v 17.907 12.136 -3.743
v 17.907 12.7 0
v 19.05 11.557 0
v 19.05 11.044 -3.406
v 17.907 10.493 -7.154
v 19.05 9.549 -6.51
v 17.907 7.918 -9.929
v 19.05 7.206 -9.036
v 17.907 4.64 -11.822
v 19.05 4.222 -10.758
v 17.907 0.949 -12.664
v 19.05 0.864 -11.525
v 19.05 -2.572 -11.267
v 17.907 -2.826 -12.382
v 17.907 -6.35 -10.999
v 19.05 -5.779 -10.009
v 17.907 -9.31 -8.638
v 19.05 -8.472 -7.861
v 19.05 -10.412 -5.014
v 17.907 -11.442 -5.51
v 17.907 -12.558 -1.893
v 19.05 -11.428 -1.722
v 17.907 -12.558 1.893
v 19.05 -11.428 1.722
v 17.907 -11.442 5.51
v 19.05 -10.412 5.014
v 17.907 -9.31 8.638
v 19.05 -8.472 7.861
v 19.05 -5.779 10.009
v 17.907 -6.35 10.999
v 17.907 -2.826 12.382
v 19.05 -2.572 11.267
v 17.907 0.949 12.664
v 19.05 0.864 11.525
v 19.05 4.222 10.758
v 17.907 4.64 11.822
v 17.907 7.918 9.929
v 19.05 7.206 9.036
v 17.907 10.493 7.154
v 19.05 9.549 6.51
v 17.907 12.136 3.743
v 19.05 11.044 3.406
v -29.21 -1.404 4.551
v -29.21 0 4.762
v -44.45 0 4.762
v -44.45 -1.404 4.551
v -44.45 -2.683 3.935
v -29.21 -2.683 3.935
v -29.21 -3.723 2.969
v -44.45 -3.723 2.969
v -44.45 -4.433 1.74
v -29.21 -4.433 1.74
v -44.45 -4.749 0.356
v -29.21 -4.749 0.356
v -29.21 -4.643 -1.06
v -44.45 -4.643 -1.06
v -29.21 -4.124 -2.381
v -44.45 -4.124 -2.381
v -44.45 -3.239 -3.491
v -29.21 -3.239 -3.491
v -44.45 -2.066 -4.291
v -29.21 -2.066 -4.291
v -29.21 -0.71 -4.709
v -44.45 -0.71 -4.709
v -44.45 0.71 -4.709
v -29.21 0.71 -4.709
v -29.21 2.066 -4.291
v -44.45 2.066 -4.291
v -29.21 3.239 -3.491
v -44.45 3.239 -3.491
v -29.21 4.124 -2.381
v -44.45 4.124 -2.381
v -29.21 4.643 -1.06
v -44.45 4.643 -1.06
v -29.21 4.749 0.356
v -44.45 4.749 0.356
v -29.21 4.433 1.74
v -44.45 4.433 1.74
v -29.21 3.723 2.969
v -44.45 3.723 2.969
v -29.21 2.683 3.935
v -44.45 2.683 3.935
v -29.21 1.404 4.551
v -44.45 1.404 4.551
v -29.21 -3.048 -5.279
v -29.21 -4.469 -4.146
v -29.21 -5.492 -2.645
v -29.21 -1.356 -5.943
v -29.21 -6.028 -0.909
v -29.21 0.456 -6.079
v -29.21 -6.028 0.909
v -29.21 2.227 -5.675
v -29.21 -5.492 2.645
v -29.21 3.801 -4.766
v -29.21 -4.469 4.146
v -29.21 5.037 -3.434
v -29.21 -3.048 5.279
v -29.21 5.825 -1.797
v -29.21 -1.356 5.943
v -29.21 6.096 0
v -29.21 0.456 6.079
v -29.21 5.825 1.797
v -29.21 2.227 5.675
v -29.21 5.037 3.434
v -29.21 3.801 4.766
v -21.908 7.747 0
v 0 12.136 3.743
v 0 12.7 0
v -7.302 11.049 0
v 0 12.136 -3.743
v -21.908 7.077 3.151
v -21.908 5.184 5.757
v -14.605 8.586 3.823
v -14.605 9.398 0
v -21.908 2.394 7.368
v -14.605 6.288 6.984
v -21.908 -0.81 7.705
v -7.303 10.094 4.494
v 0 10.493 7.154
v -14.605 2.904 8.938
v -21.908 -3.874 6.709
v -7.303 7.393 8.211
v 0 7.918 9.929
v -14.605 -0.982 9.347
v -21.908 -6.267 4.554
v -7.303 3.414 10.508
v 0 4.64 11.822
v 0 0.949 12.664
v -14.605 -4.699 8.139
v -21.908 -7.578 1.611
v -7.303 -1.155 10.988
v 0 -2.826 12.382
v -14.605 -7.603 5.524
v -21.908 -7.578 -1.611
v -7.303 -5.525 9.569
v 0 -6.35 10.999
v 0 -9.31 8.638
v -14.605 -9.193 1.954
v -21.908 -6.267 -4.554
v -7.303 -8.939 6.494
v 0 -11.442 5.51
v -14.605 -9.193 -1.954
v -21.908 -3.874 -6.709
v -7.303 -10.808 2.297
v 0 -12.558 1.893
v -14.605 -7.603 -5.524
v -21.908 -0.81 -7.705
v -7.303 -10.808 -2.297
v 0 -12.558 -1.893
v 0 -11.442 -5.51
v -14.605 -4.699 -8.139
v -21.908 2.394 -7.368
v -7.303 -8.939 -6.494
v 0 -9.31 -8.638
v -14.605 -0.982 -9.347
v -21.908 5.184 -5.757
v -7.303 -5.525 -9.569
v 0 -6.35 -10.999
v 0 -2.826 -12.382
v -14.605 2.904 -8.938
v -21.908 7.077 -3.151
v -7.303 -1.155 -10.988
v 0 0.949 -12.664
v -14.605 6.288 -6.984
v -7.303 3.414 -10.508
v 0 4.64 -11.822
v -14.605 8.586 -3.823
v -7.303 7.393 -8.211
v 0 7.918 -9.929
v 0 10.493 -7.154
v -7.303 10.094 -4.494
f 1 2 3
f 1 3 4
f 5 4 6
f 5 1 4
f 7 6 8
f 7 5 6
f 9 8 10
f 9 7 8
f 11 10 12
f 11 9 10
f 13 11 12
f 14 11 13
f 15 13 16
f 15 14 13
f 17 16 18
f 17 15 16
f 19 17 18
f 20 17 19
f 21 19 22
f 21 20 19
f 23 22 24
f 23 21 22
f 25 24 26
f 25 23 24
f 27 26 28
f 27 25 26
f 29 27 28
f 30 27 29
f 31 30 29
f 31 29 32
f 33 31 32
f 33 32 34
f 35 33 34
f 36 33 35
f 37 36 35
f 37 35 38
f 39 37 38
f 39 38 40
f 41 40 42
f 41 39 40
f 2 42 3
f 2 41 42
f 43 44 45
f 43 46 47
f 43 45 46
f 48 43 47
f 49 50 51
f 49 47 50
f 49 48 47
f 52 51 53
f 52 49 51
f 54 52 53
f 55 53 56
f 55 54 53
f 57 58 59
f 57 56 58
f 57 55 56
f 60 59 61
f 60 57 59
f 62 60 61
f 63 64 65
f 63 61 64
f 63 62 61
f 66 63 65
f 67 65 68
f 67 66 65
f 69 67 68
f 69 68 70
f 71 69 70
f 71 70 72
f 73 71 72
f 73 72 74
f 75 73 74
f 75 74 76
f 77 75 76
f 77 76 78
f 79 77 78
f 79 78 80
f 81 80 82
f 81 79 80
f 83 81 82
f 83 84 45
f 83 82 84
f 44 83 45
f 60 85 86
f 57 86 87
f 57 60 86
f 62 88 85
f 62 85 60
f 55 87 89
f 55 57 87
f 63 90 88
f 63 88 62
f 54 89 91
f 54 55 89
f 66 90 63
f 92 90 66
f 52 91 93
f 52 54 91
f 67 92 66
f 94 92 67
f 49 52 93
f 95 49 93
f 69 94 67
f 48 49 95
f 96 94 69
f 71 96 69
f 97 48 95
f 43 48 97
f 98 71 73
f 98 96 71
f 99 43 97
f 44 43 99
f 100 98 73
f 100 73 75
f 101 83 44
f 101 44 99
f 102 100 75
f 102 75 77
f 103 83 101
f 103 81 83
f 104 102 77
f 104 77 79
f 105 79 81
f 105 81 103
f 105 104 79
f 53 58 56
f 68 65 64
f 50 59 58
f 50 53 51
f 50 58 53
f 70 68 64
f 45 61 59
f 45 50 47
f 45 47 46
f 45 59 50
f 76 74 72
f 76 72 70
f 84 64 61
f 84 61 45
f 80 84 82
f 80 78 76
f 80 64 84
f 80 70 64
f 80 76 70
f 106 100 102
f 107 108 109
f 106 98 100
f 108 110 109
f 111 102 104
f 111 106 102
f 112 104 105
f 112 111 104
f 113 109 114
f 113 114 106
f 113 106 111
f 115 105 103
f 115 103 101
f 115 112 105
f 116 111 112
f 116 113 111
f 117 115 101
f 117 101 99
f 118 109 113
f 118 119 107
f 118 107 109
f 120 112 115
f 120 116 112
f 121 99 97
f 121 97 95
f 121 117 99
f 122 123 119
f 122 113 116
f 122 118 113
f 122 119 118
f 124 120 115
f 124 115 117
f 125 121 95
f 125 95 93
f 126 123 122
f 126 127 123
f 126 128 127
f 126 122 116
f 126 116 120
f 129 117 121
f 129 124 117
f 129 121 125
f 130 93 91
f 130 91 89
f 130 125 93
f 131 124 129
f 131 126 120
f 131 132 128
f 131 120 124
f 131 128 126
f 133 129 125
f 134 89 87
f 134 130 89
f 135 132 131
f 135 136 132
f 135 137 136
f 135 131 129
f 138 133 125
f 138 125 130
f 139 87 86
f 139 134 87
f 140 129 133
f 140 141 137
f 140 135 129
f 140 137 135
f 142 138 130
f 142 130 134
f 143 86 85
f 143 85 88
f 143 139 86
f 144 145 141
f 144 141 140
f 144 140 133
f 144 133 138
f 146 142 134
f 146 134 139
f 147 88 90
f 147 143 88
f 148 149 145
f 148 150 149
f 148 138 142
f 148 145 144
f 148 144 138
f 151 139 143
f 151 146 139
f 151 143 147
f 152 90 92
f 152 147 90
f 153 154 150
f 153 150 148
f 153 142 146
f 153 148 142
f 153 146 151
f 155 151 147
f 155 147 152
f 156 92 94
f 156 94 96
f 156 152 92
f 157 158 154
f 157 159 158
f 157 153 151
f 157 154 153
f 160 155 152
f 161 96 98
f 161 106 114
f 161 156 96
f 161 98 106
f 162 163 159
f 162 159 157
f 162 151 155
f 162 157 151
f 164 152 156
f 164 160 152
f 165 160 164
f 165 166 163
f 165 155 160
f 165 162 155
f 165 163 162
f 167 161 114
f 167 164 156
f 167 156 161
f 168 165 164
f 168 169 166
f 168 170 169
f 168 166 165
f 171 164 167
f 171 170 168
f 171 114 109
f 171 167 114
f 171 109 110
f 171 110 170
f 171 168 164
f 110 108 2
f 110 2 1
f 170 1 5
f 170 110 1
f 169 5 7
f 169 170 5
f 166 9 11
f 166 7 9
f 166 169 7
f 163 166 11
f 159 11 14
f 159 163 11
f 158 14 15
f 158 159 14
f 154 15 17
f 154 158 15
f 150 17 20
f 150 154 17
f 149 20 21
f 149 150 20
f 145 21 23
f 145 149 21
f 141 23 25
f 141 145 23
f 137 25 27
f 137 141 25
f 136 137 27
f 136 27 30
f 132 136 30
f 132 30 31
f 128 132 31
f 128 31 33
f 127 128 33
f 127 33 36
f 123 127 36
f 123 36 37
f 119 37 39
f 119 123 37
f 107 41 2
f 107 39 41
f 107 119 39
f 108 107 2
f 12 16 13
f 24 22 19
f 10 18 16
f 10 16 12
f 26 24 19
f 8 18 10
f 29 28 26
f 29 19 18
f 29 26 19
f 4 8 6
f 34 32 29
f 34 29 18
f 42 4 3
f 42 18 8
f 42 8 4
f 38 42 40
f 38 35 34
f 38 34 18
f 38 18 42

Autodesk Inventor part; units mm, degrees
ref_plane "YZ Plane" through (0, 0, 0) normal (1, 0, 0) x (0, 1, 0)
ref_plane "XZ Plane" through (0, 0, 0) normal (0, 1, 0) x (-1, 0, 0)
ref_plane "XY Plane" through (0, 0, 0) normal (0, 0, 1) x (1, 0, 0)
sketch "Sketch1" plane through (0, 0, 0) normal (1, 0, 0) x (0, 1, 0)
  circle A0 centre (0, 0) radius 12.7
  dimension "d0" = 25.4
extrude "Extrusion1" add sketch "Sketch1" along normal blind 19.05
chamfer "Chamfer1" distance 1.143 angle 45 1 edges at (19.05, -12.7, 0)
sketch "Sketch2" plane through (0, 0, 0) normal (-1, 0, 0) x (0, 0, 1)
  circle A0 centre (0, 0) radius 12.7
ref_plane "Work Plane1" through (-29.21, 0, 0) normal (-1, 0, 0) x (0, 0, 1)
sketch "Sketch3" plane through (-29.21, 0, 0) normal (-1, 0, 0) x (0, 0, 1)
  circle A0 centre (0, 0) radius 6.096
  dimension "d7" = 12.192
loft "Loft1" add profiles "Sketch3" section 1 edges at (0, -12.7, 0)
sketch "Sketch4" plane through (-29.21, 0, 0) normal (-1, 0, 0) x (0, 0, 1)
  circle A0 centre (0, 0) radius 4.7625
  dimension "d12" = 9.525
extrude "Extrusion2" add sketch "Sketch4" along normal blind 15.24
properties part number "Kevin_CAD_test_2"
